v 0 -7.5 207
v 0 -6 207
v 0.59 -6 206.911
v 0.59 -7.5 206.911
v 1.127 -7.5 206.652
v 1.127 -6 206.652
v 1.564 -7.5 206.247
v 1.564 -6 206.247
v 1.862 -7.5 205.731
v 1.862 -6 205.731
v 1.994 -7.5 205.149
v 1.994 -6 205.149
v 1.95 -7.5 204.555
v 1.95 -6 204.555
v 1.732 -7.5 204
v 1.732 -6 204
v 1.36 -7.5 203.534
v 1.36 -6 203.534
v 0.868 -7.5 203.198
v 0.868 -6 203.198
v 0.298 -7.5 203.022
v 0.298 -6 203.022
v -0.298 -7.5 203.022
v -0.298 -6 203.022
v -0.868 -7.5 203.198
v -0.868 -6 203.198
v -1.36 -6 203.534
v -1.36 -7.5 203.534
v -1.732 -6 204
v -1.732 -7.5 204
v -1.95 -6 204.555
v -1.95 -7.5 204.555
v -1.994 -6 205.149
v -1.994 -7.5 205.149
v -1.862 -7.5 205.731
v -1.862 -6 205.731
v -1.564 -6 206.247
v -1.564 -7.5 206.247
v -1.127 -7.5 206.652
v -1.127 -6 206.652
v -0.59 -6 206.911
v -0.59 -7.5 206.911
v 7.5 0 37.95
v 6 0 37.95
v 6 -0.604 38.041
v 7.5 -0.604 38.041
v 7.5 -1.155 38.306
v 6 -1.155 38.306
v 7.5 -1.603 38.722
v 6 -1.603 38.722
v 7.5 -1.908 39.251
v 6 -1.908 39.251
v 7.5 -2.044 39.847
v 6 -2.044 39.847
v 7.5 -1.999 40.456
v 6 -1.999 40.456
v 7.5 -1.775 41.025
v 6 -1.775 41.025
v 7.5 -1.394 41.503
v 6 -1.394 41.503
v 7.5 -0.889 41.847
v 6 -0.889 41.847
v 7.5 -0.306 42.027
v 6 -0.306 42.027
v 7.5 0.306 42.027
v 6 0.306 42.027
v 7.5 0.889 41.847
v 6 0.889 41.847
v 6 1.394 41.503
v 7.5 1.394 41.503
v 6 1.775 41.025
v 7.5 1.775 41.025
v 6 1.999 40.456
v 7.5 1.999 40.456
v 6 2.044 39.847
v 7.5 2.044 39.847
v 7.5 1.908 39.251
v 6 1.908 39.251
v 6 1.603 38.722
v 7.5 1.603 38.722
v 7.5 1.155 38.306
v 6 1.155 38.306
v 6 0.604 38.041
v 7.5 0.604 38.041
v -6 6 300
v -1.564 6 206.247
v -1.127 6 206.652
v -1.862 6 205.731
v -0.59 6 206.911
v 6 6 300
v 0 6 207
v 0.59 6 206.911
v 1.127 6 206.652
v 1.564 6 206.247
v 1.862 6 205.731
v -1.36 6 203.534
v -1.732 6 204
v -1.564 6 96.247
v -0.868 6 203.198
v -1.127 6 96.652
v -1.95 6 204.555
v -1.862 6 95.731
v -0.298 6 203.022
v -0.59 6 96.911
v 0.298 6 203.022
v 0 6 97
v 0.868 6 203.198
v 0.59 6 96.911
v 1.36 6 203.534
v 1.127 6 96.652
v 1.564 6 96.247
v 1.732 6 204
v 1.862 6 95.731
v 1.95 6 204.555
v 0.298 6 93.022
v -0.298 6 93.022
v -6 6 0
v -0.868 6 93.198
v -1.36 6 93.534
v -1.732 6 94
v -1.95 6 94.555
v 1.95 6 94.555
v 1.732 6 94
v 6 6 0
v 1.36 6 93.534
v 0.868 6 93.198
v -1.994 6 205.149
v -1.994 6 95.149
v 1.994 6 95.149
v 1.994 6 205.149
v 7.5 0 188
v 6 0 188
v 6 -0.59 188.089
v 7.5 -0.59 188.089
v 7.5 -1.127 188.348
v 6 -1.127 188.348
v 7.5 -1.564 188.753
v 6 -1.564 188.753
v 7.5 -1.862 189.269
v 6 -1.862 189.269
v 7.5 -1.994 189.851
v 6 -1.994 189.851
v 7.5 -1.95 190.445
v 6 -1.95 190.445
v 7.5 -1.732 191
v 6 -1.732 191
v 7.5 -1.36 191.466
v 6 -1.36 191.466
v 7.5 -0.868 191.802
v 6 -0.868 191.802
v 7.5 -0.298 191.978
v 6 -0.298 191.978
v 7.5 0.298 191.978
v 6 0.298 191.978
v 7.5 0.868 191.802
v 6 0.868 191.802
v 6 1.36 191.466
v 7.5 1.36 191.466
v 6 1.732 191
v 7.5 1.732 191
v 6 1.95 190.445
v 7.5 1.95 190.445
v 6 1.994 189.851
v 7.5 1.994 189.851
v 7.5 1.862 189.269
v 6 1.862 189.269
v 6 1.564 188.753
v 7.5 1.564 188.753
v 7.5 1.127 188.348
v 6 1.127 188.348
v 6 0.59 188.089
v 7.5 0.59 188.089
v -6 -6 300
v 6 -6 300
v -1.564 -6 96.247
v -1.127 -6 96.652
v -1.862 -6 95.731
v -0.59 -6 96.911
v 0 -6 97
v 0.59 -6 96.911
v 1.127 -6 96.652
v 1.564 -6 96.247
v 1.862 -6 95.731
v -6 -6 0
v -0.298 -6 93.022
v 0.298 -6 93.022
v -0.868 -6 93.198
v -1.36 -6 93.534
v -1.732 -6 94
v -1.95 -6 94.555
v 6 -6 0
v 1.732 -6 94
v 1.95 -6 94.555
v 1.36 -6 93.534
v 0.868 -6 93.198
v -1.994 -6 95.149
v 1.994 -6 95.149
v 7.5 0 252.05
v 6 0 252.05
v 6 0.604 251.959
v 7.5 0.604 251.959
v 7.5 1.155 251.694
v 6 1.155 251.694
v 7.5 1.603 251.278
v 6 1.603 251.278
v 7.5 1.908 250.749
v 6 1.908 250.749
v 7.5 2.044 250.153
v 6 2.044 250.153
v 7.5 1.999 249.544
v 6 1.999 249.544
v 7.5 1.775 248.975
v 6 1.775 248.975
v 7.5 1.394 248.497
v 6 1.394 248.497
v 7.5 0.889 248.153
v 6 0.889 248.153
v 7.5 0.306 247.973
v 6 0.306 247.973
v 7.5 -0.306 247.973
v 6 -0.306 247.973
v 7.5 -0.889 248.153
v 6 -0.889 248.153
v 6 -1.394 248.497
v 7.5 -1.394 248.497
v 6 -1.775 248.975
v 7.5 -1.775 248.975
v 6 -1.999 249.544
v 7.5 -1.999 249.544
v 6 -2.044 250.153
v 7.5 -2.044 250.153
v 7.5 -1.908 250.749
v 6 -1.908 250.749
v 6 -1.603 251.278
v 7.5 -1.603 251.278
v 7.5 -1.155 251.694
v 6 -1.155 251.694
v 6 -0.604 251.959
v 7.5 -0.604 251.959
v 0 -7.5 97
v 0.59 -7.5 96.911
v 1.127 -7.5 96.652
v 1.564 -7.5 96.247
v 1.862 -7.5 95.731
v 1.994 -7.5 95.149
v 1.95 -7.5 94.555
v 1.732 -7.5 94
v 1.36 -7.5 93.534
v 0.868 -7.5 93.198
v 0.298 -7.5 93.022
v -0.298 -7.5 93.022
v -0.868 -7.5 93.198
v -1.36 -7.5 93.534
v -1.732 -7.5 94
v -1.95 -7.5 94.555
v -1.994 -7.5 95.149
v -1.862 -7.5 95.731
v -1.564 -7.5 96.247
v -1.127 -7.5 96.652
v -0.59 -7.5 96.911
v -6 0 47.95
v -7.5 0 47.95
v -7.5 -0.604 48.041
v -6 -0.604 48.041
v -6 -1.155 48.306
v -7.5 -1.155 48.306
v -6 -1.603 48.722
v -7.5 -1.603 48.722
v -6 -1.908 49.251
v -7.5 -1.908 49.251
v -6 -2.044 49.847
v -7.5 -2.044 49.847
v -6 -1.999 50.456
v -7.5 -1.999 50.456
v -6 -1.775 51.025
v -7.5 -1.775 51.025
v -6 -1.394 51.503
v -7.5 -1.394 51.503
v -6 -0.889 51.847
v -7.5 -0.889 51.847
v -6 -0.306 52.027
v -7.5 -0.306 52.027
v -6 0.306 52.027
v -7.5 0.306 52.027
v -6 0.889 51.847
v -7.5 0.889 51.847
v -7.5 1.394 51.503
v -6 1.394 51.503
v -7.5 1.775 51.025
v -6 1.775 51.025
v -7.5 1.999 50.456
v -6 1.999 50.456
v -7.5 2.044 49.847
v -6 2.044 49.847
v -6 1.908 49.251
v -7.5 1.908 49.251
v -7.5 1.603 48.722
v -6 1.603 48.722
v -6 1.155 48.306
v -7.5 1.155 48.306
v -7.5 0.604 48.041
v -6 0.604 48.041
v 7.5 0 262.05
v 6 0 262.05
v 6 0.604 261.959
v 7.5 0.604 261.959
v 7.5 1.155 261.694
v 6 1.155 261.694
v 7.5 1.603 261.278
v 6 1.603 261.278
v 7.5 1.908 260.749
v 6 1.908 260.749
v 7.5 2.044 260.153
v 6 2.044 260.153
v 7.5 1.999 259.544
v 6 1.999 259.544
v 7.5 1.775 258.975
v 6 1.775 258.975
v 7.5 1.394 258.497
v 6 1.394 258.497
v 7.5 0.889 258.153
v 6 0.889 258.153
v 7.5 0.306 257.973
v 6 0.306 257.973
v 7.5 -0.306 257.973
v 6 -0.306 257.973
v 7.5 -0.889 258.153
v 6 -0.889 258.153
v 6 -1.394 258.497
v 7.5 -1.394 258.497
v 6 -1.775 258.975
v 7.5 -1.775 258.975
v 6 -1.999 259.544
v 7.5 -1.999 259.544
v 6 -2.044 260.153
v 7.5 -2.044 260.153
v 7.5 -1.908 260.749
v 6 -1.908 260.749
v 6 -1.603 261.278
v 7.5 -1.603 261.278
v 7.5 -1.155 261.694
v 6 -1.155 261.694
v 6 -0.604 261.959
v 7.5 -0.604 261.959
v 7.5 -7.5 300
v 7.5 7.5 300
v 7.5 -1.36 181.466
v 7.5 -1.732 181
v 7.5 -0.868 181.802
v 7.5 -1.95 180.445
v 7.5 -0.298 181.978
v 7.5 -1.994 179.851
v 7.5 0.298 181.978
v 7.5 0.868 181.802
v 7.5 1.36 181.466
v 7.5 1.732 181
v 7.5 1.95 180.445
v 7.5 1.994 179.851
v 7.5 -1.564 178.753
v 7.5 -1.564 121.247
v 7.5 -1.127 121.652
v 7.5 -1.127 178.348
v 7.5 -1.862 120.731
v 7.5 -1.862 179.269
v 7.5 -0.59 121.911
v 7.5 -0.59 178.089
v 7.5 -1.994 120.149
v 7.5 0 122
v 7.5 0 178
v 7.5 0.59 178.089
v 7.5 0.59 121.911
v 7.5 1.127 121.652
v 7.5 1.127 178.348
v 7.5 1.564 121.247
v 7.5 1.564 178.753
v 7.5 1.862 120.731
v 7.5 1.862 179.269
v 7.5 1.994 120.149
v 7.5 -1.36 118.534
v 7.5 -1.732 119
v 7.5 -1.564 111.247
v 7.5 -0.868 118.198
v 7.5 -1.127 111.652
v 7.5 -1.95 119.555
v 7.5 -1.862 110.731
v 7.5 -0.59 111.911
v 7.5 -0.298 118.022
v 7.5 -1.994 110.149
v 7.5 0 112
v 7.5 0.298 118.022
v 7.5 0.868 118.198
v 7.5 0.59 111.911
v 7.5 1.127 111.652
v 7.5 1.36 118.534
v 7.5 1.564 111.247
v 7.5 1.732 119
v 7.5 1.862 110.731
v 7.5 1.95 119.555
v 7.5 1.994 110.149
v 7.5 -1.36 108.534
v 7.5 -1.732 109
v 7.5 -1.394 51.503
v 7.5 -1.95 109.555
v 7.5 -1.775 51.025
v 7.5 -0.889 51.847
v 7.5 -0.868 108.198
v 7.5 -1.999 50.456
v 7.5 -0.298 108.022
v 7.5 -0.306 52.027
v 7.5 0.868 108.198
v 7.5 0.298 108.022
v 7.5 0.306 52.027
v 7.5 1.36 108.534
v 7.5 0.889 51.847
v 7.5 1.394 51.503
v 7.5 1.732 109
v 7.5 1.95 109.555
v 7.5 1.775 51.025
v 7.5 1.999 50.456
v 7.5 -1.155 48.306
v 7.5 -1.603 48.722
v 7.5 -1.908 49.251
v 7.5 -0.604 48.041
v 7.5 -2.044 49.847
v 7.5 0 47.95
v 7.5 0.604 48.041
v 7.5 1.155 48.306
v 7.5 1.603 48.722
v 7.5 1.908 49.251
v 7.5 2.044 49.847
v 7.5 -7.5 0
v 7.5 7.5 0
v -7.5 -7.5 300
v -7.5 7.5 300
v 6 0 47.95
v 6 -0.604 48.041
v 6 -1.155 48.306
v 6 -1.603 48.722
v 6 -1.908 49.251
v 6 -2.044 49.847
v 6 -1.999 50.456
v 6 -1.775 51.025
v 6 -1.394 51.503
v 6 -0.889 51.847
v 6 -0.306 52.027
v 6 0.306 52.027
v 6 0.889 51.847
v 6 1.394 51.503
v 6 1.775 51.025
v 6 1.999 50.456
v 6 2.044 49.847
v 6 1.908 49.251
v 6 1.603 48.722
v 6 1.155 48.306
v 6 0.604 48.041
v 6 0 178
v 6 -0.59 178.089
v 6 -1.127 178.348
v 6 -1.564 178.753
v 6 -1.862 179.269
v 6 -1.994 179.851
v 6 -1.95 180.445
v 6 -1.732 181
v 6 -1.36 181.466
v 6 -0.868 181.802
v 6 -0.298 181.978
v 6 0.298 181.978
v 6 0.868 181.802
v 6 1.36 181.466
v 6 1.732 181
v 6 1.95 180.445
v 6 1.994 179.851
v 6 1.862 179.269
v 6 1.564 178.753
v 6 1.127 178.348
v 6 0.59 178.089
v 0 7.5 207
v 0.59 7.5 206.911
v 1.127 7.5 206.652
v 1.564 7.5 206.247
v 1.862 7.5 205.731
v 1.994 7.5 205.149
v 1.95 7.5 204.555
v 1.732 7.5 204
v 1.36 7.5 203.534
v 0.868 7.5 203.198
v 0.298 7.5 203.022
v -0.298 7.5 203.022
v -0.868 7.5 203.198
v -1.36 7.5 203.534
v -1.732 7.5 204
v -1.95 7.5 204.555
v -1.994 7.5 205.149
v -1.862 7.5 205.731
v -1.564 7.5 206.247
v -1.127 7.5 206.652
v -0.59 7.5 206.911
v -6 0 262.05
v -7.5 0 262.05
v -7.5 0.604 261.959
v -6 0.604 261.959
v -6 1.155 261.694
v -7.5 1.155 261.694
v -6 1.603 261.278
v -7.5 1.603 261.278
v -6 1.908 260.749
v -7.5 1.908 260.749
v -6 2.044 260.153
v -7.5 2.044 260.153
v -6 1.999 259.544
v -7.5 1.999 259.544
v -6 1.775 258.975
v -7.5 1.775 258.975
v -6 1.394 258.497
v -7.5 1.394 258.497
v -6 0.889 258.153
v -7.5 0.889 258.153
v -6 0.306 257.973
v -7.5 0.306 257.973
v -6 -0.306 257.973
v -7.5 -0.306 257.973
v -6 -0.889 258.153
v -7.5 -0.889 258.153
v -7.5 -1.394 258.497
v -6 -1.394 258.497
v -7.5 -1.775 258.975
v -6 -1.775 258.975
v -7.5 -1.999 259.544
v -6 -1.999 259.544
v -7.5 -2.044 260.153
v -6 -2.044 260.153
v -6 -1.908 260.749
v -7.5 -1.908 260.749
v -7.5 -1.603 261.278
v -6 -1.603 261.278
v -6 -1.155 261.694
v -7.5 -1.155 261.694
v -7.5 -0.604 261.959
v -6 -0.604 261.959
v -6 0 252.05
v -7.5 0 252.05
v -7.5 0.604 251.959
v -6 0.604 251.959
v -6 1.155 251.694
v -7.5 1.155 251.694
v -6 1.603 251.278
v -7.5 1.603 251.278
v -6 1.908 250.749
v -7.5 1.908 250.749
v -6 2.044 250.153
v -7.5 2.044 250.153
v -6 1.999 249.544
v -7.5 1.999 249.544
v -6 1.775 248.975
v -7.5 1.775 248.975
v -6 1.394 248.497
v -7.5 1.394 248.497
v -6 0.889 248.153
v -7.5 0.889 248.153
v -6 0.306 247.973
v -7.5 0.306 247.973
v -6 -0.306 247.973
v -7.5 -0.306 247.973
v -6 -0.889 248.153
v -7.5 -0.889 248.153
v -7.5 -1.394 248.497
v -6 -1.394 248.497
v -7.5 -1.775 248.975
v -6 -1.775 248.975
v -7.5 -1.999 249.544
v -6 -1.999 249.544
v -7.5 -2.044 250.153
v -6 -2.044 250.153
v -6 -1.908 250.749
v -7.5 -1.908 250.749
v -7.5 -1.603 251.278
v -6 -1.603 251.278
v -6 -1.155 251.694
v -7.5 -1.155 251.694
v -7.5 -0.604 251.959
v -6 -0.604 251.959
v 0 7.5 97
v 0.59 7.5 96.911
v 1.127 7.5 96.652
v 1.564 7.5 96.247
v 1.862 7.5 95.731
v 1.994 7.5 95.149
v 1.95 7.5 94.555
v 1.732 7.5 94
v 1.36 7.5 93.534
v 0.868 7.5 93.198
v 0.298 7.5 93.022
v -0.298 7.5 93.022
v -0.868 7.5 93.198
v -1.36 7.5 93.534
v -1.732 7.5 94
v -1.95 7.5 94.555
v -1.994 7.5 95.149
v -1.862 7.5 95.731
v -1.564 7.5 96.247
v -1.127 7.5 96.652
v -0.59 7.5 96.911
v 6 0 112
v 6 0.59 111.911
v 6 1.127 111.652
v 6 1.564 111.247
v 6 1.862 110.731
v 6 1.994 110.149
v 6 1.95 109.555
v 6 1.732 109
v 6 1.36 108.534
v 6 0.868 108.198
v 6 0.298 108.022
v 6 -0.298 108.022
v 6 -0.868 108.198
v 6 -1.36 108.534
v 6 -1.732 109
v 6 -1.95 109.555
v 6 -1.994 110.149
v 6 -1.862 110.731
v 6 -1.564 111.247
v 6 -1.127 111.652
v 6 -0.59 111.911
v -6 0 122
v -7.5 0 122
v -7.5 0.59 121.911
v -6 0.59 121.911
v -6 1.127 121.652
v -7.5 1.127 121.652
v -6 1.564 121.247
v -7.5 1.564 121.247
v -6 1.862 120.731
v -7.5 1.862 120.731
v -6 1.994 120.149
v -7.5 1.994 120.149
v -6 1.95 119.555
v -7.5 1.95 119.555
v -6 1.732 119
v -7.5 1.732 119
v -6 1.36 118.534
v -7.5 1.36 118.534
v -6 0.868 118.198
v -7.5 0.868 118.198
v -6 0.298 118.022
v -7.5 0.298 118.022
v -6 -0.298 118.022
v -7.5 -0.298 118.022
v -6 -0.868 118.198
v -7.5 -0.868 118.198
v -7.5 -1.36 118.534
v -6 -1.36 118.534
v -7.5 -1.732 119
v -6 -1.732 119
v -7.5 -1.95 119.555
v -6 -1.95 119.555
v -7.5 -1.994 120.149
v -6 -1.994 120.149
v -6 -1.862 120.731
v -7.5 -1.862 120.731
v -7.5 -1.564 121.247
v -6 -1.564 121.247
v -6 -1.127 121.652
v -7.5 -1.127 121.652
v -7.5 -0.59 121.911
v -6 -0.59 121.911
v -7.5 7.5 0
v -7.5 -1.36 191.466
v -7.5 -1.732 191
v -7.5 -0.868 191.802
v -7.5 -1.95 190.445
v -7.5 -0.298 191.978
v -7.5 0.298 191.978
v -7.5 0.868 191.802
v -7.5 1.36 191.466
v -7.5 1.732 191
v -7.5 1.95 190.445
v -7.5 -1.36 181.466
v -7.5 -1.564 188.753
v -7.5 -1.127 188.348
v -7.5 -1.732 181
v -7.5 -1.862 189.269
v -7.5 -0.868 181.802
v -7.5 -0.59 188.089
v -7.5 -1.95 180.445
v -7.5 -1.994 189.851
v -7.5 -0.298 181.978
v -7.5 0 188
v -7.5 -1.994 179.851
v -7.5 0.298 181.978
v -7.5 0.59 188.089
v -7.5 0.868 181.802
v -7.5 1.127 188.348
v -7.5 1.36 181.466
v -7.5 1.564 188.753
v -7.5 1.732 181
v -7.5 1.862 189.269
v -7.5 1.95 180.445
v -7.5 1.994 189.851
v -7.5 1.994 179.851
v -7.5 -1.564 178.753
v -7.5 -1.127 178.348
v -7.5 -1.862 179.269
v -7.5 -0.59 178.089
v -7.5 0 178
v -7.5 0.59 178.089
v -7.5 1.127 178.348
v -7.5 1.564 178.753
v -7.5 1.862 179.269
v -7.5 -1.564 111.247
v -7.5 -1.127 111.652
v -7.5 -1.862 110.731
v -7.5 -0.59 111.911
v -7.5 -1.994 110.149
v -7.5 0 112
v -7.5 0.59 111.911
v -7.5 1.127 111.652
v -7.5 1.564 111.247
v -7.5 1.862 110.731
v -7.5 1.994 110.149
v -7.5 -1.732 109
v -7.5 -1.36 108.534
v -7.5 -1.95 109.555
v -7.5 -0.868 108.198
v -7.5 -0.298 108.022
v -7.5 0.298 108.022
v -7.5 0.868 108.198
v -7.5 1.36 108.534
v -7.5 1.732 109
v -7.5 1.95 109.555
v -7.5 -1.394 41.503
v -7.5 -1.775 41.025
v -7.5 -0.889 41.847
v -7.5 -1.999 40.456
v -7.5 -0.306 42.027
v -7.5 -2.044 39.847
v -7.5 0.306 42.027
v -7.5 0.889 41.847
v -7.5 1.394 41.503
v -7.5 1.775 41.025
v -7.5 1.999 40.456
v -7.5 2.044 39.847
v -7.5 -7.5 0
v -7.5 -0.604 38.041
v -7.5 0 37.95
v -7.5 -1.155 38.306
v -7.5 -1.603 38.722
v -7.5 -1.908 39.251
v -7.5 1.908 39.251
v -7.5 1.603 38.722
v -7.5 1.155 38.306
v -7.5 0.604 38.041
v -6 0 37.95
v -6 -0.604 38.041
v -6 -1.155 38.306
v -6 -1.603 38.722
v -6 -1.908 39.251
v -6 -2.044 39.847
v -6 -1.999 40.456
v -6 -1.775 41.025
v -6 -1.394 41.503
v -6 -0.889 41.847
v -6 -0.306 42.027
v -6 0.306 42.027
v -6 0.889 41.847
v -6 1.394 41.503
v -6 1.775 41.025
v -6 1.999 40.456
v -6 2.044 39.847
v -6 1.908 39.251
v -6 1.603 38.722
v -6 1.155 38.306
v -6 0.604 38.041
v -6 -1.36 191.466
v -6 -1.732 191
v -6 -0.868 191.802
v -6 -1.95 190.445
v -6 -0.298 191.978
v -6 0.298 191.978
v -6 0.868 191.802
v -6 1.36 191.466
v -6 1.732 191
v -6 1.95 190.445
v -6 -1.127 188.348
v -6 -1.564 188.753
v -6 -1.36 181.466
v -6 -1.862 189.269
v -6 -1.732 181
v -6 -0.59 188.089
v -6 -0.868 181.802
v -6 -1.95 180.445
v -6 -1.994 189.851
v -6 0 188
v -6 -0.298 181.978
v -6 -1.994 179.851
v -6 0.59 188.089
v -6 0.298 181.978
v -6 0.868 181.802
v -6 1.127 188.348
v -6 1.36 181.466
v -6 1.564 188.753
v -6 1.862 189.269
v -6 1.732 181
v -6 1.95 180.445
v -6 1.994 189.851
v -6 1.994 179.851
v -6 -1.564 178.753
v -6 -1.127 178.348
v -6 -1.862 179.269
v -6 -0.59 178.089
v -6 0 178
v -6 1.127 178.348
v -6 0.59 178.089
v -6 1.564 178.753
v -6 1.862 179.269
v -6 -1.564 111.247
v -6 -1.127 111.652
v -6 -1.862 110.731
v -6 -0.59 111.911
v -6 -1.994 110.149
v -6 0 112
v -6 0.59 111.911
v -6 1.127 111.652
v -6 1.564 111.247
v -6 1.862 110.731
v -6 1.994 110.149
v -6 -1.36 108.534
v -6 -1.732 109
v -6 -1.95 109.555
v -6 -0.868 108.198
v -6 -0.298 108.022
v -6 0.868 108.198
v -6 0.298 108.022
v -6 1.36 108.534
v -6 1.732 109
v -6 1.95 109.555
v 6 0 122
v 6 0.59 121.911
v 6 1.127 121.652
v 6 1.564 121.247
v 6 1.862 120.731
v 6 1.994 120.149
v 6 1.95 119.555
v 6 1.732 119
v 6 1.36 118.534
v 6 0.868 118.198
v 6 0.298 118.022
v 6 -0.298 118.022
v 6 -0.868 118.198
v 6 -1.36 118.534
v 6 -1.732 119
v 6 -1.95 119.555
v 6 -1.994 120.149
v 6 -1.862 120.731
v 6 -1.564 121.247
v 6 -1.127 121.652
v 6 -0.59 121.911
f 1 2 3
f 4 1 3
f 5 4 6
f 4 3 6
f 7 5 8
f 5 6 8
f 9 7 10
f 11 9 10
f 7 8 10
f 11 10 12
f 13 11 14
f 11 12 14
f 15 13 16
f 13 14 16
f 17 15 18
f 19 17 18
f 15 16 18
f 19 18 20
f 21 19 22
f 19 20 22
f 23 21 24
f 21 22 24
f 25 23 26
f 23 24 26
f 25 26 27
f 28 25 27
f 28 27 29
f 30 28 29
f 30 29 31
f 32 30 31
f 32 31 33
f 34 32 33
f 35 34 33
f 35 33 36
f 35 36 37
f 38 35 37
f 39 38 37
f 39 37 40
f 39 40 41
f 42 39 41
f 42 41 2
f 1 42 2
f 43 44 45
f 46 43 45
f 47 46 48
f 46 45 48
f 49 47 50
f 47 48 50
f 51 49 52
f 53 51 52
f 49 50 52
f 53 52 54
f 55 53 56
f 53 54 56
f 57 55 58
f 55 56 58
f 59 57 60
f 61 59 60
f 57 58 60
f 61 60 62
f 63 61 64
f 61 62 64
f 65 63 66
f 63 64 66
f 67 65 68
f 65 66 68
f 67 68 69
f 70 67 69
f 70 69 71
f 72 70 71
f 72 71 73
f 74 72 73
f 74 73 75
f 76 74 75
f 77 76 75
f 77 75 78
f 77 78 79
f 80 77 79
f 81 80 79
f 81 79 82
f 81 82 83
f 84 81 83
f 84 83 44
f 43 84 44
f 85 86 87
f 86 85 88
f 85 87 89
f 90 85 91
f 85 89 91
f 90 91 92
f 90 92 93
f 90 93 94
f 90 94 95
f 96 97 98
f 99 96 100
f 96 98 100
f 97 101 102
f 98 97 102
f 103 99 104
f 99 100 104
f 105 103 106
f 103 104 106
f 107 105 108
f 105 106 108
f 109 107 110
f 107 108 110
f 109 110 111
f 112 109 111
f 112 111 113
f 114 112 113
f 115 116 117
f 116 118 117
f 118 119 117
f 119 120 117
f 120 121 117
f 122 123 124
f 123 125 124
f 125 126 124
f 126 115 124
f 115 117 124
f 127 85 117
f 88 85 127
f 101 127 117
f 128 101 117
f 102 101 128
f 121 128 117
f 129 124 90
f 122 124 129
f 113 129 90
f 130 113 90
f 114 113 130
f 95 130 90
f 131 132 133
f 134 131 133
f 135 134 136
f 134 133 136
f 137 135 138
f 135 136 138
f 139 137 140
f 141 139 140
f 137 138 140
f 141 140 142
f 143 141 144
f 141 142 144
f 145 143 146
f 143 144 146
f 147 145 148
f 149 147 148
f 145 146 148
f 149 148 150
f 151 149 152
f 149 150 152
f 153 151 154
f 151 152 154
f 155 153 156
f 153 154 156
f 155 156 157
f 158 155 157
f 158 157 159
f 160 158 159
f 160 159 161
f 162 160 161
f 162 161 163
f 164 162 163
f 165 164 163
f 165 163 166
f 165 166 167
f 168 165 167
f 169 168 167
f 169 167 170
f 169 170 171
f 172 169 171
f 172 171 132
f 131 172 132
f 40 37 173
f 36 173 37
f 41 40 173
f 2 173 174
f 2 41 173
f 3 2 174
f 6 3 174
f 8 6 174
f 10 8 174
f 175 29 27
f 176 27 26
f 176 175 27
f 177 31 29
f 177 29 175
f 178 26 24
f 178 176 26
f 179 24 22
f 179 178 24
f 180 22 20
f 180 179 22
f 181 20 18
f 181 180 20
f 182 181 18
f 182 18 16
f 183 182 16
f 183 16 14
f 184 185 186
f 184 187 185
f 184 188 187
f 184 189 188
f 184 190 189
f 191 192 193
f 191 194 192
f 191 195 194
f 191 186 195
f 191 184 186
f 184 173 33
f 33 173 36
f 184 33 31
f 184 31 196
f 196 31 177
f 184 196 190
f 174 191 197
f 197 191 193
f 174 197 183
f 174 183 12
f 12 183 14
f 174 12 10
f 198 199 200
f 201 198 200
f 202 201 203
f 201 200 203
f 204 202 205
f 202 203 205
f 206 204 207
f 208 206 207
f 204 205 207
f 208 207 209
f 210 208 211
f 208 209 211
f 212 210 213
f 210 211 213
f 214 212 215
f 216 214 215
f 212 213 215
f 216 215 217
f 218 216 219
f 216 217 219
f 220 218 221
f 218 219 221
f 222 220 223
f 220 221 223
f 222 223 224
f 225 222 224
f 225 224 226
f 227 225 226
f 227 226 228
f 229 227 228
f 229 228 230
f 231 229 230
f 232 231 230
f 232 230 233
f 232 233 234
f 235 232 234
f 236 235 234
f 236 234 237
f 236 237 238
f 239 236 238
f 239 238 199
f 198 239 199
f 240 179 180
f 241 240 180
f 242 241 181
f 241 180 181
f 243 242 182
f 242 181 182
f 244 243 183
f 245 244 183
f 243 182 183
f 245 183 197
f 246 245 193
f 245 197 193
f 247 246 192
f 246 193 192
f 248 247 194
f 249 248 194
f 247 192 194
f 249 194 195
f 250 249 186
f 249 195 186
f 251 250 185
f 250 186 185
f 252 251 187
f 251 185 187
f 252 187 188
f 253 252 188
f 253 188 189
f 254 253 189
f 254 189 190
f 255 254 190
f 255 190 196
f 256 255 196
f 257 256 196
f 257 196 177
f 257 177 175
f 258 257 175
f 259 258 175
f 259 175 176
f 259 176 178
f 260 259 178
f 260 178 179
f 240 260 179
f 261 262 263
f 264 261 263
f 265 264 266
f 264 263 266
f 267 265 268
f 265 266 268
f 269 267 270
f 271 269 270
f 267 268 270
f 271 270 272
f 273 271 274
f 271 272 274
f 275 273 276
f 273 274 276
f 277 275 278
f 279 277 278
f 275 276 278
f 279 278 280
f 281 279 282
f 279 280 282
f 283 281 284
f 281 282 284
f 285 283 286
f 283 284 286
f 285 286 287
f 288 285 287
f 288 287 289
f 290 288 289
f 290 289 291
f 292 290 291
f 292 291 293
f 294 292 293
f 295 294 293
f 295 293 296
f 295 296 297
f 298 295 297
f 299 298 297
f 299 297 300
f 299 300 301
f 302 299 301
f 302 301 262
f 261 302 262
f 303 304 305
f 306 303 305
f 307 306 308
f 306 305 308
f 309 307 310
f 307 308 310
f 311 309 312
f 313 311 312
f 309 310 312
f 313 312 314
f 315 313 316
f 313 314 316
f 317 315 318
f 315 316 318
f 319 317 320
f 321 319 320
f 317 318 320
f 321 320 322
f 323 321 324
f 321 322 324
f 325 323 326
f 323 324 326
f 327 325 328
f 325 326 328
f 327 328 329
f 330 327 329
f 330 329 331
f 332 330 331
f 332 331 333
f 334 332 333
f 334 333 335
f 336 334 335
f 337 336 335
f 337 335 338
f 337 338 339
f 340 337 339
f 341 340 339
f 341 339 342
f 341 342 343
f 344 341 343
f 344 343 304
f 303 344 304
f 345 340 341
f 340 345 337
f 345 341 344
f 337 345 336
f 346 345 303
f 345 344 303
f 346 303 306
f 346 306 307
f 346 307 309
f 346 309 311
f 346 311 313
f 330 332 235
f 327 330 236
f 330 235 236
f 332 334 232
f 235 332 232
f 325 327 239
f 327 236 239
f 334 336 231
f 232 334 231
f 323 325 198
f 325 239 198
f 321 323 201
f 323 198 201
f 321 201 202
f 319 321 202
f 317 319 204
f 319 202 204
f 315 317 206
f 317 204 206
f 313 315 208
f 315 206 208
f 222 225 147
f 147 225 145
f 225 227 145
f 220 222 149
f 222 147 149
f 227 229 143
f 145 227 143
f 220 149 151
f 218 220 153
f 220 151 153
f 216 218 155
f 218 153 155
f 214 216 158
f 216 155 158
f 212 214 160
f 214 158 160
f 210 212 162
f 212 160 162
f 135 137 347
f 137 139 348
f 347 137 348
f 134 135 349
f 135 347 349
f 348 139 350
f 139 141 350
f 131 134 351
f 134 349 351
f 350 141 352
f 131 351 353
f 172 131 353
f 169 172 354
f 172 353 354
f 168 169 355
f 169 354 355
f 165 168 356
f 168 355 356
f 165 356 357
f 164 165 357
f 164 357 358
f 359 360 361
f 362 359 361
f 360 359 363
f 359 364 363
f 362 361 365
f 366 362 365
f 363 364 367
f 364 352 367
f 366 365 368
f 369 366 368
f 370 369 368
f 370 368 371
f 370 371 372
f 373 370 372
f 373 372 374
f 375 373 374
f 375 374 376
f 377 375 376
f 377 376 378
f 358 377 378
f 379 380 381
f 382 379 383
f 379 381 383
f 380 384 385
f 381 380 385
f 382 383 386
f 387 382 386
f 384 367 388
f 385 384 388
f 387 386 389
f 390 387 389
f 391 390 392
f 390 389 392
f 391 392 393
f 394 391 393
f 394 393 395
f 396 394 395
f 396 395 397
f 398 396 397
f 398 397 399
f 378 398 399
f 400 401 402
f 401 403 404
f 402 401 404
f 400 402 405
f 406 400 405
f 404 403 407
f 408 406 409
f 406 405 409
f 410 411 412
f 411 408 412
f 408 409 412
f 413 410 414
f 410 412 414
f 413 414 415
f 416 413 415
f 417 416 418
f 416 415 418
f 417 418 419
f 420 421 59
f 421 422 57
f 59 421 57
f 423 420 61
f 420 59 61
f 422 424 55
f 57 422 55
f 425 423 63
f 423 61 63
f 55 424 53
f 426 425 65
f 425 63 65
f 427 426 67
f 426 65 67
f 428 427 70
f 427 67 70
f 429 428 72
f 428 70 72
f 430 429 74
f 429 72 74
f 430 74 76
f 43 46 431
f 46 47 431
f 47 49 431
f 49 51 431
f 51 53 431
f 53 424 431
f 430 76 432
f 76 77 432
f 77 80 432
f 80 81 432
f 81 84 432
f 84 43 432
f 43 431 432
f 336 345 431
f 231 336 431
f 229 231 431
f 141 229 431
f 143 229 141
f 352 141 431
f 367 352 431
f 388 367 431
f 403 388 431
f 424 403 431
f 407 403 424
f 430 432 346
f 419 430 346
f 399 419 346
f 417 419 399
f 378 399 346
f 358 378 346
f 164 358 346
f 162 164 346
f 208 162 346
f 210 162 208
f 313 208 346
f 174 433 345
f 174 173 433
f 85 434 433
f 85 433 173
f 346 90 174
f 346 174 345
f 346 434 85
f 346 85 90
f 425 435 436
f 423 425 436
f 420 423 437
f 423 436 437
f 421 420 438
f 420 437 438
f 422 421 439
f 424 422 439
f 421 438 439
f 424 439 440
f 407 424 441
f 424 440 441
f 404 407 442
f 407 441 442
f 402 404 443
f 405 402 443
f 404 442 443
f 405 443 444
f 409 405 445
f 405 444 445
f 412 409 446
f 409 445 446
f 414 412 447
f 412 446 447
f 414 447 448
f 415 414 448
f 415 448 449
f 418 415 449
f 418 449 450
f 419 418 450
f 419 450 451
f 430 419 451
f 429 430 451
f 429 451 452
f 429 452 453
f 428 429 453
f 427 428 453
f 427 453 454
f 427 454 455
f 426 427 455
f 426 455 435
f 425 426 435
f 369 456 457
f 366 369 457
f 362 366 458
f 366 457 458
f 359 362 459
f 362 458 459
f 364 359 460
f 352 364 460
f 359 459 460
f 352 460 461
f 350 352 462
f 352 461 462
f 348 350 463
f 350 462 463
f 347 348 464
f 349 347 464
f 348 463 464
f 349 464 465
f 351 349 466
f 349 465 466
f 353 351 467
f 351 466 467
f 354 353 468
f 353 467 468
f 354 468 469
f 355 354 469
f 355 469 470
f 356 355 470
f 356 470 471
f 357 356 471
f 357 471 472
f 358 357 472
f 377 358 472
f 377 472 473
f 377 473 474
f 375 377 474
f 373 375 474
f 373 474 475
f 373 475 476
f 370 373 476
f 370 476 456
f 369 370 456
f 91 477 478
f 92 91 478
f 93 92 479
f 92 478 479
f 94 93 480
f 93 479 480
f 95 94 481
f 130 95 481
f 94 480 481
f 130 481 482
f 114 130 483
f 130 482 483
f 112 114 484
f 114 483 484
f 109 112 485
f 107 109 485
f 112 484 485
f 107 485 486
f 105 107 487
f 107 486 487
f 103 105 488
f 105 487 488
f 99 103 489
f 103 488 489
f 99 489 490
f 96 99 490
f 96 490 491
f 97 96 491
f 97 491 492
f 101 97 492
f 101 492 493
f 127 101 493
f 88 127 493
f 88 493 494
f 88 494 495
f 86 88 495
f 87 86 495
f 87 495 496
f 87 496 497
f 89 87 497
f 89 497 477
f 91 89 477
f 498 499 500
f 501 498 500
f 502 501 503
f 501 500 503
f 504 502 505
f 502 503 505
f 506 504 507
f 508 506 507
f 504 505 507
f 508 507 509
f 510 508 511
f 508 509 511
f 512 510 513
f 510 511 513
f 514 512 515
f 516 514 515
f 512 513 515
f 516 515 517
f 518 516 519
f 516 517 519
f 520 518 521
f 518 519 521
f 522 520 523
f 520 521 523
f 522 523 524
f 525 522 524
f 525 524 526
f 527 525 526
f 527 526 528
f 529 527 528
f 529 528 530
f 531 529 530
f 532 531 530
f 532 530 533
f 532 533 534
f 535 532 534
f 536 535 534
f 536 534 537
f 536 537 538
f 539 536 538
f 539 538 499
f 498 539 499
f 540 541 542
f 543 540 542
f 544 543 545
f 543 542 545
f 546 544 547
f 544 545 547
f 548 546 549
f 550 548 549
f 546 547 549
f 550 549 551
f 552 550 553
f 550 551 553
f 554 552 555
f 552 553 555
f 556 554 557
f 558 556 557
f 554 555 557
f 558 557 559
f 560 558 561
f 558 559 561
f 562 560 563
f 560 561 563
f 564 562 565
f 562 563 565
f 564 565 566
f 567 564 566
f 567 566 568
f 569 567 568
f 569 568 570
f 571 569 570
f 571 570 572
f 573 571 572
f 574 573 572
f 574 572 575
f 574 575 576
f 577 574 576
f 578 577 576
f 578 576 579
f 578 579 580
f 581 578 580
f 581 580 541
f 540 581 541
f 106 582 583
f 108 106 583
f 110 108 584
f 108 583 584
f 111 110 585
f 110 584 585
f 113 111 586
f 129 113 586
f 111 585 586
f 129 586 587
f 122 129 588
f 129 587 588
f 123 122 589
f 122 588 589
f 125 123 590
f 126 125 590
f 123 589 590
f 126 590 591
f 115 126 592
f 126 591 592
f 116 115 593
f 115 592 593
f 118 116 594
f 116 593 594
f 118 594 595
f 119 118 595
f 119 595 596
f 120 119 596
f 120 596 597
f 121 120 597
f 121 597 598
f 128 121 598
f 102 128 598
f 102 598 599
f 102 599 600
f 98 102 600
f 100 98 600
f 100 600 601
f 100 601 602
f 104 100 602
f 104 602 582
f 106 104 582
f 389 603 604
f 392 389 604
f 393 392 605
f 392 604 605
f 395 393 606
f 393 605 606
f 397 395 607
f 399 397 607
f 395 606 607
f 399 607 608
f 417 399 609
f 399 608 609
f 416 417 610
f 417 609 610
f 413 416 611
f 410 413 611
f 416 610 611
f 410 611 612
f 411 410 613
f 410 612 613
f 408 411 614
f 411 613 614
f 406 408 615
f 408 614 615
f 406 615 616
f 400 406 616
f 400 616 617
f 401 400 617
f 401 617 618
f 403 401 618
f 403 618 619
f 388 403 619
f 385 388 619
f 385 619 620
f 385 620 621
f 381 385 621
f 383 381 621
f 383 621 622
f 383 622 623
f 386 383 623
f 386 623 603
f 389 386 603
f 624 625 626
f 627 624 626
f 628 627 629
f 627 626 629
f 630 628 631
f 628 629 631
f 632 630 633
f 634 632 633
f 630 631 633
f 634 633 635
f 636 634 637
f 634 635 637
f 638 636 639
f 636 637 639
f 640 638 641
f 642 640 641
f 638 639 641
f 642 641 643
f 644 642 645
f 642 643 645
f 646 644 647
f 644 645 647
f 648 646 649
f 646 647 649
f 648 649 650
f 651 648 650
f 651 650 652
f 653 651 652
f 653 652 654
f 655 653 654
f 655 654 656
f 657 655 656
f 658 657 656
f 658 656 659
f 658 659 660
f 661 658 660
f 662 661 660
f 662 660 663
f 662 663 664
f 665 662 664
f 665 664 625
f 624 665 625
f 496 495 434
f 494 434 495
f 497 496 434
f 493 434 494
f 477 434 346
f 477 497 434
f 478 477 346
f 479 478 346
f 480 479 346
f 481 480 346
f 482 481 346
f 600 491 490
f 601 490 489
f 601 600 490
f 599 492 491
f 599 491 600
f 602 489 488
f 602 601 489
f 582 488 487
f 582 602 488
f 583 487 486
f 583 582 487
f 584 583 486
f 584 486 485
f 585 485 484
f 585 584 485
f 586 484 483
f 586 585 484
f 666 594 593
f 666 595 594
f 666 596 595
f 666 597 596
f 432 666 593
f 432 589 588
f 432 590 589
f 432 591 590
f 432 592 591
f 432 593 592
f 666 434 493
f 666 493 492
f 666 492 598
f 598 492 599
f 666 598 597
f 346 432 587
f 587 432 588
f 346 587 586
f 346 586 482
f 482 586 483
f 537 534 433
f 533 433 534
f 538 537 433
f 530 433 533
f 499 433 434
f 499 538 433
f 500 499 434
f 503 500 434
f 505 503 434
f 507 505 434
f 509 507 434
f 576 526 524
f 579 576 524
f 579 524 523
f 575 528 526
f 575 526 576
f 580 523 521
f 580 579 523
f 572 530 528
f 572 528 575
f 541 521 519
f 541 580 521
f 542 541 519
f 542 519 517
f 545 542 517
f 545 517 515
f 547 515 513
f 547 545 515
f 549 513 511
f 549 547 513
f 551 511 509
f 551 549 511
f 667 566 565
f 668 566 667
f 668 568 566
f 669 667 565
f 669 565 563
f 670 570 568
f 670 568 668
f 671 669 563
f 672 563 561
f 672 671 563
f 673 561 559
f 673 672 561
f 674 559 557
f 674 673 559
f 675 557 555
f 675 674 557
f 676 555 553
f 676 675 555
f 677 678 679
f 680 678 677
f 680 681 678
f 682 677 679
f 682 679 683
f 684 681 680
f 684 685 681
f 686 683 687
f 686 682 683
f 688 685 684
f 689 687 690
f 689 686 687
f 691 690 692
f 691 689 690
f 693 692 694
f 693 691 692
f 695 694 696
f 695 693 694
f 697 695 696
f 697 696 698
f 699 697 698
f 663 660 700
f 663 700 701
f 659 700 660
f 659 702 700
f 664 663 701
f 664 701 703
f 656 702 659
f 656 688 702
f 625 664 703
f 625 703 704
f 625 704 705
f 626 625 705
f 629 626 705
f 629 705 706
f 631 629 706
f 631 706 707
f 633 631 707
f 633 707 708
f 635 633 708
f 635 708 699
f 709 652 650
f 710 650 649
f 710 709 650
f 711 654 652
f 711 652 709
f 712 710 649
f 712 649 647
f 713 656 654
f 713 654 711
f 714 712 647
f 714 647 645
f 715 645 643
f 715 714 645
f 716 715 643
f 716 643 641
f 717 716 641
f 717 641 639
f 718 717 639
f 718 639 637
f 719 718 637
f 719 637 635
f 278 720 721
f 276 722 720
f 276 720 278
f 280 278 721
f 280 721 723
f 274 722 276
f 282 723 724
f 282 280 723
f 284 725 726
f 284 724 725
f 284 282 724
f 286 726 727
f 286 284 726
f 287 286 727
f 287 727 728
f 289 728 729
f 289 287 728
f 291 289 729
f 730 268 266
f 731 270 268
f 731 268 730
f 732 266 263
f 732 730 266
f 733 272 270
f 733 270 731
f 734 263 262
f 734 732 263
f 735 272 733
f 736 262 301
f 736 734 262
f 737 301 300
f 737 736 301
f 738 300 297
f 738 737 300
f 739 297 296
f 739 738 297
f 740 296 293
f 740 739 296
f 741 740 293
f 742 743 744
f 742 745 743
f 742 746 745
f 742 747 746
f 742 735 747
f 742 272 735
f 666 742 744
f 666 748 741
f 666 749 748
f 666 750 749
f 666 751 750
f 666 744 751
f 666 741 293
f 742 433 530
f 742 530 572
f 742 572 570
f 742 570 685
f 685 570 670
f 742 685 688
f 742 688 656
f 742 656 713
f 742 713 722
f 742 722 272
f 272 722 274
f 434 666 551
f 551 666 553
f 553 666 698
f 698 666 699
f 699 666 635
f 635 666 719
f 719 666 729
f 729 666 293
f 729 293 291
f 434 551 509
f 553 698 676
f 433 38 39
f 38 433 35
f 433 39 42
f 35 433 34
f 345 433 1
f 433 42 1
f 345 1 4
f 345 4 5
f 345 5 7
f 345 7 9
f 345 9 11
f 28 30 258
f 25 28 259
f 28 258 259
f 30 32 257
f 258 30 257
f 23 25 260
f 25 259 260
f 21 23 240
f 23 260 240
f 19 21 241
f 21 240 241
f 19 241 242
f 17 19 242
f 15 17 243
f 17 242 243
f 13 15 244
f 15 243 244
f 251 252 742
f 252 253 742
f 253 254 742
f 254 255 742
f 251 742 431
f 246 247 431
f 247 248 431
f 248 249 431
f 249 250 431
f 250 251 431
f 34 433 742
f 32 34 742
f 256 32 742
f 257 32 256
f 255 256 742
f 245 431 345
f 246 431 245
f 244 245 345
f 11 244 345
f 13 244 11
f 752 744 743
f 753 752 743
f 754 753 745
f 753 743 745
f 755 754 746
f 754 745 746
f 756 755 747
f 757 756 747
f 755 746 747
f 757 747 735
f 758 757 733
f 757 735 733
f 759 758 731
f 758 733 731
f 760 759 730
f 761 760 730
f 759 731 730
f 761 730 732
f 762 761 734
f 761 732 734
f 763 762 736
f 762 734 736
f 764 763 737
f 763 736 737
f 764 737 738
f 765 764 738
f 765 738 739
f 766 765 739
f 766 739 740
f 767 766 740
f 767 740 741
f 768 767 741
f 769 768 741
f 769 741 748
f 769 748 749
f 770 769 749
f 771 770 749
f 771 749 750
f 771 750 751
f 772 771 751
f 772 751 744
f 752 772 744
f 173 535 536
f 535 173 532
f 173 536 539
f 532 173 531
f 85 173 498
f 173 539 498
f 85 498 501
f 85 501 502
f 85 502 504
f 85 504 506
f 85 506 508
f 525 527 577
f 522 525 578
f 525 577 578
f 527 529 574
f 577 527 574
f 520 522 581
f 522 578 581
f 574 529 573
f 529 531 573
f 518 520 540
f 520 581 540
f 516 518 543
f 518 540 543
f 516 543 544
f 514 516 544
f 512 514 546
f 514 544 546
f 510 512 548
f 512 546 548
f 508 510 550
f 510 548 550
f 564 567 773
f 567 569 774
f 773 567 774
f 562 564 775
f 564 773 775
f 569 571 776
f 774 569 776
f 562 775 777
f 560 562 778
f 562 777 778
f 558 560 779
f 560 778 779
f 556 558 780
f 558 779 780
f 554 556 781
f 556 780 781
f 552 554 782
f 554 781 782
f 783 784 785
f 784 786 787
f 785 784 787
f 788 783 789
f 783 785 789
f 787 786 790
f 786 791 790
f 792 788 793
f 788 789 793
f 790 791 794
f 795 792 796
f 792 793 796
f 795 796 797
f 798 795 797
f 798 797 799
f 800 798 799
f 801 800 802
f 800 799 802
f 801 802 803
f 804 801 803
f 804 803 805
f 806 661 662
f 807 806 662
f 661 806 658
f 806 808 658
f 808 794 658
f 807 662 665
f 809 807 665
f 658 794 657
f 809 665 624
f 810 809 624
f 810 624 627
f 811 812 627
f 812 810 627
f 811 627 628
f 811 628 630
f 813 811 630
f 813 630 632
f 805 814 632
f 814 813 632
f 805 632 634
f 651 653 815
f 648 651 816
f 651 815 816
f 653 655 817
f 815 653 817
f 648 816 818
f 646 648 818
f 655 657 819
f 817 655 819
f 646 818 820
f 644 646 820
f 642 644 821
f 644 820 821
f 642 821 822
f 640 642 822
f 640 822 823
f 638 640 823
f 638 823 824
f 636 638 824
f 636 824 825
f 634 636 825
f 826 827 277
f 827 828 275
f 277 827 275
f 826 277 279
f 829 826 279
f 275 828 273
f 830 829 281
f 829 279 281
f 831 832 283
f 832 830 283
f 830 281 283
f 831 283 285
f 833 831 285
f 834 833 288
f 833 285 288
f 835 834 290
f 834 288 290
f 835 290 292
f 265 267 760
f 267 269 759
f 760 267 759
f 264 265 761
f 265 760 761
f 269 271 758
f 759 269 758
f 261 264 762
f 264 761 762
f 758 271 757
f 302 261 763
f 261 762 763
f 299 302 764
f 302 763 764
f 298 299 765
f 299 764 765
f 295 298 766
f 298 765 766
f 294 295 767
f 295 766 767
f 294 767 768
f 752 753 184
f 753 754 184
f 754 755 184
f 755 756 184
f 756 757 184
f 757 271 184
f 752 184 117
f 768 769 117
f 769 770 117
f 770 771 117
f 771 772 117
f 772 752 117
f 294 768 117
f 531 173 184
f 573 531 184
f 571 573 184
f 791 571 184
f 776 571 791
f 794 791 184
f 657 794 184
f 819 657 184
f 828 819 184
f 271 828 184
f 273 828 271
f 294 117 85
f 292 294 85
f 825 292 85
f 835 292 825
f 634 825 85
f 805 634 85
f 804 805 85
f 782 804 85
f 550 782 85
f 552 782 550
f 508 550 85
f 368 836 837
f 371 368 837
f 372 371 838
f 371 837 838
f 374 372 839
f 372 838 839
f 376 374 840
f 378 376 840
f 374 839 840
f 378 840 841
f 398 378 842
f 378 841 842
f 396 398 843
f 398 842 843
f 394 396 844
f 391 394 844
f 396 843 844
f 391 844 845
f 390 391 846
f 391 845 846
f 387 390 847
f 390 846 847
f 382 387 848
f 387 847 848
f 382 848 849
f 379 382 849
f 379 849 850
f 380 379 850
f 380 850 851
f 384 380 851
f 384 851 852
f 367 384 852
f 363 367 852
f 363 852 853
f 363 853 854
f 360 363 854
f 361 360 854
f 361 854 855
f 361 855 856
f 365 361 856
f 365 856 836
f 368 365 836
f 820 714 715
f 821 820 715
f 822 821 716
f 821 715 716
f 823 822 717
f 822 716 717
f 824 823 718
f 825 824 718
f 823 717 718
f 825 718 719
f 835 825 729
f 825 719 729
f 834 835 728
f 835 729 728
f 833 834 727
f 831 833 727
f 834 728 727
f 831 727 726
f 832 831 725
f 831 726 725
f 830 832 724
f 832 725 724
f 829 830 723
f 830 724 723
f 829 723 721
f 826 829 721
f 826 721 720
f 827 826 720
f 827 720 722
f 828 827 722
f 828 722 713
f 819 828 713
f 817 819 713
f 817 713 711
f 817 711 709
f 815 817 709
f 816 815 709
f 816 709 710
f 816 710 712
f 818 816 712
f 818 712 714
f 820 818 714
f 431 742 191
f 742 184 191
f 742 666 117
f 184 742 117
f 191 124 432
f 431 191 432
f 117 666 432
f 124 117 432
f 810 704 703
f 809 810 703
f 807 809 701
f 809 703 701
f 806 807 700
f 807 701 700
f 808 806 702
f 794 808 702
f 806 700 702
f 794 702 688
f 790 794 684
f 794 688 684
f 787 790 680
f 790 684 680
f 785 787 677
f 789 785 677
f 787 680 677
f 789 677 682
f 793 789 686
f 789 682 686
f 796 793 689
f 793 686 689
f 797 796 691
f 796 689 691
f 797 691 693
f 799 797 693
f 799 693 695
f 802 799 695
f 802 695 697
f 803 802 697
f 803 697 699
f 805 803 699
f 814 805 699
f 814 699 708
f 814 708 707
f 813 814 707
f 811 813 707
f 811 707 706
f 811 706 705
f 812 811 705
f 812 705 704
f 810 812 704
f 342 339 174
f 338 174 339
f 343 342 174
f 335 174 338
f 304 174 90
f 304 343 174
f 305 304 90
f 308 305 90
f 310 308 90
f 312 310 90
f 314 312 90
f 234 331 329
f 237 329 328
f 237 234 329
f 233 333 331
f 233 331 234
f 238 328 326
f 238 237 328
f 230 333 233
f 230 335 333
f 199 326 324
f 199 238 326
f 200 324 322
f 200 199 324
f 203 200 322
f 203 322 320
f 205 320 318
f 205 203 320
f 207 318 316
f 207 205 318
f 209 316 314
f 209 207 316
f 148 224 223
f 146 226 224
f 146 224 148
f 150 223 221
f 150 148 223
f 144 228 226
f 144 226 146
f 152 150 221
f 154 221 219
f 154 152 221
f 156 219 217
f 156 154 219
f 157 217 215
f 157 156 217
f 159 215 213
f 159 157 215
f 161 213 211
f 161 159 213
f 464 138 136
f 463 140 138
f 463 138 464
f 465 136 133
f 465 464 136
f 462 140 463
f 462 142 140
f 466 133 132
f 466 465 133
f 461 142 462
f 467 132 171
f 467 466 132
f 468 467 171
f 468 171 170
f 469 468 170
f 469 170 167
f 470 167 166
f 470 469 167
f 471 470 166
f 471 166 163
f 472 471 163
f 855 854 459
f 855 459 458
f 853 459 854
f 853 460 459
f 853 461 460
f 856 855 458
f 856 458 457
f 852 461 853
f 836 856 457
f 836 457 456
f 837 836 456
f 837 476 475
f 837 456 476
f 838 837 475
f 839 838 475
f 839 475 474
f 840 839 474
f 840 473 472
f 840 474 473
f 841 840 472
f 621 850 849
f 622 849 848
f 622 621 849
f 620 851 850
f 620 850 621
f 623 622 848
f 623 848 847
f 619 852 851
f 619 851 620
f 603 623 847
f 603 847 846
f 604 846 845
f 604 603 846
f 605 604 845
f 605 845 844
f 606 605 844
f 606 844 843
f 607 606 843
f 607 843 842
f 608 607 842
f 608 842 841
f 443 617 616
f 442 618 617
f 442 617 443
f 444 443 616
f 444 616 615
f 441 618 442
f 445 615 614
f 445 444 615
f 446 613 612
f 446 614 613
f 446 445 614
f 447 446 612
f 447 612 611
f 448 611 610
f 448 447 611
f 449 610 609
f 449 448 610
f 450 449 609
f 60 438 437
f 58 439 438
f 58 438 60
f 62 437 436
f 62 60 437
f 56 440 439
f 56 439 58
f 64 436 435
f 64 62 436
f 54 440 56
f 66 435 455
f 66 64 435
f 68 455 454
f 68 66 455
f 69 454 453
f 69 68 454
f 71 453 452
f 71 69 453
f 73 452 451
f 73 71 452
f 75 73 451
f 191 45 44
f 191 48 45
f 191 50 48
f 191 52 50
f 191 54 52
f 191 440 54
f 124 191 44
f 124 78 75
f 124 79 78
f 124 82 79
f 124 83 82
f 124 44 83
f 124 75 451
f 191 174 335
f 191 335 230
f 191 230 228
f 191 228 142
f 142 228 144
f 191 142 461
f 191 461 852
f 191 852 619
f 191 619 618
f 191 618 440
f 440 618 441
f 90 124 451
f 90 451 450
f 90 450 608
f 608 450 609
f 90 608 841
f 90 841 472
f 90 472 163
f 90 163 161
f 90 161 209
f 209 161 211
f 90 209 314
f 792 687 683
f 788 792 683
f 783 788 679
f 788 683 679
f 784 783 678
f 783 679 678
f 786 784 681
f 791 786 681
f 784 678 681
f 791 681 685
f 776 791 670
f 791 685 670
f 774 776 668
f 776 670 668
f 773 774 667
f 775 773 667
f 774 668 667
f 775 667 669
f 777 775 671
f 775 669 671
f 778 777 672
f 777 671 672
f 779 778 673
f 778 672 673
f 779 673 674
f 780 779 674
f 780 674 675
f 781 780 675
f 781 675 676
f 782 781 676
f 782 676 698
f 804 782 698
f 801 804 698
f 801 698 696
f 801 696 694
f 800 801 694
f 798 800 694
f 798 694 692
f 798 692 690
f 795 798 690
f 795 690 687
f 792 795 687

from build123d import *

# Parameters (mm, degrees)
SKETCH_1_W          = 15
SKETCH_1_H          = 15
SKETCH_1_W_2        = 12
SKETCH_1_H_2        = 12
EXTRUDE_1_DEPTH     = 300
SKETCH_2_R          = 2
CUT_EXTRUDE_1_DEPTH = 30
SKETCH_4_R          = 2.05
CUT_EXTRUDE_3_DEPTH = 120
SKETCH_5_R          = 2
CUT_EXTRUDE_4_DEPTH = 49


with BuildPart() as part:
    # 草图1 → 凸台-拉伸1 (new body)
    with BuildSketch(Plane.XY):
        Rectangle(SKETCH_1_W, SKETCH_1_H)
        Rectangle(SKETCH_1_W_2, SKETCH_1_H_2, mode=Mode.SUBTRACT)
    extrude(amount=EXTRUDE_1_DEPTH)

    # 草图2 → 切除-拉伸1 (cut)
    with BuildSketch(Plane(origin=(0, 7.5, 0), x_dir=(1, 0, 0), z_dir=(0, 1, 0))):
        with Locations(Location((0, -205, 0), (0, 0, 270))):
            Circle(SKETCH_2_R)
        with Locations(Location((0, -95, 0), (0, 0, 270))):
            Circle(SKETCH_2_R)
    extrude(amount=-CUT_EXTRUDE_1_DEPTH, mode=Mode.SUBTRACT)

    # 草图4 → 切除-拉伸3 (cut)
    with BuildSketch(Plane.ZY.offset(7.5)):
        with Locations((250, 0)):
            Circle(SKETCH_4_R)
        with Locations((260, 0)):
            Circle(SKETCH_4_R)
        with Locations(Location((40, 0, 0), (0, 0, 180))):
            Circle(SKETCH_4_R)
        with Locations(Location((50, 0, 0), (0, 0, 180))):
            Circle(SKETCH_4_R)
    extrude(amount=-CUT_EXTRUDE_3_DEPTH, mode=Mode.SUBTRACT)

    # 草图5 → 切除-拉伸4 (cut)
    with BuildSketch(Plane.ZY.offset(7.5)):
        with Locations((120, 0)):
            Circle(SKETCH_5_R)
        with Locations((110, 0)):
            Circle(SKETCH_5_R)
        with Locations(Location((190, 0, 0), (0, 0, 180))):
            Circle(SKETCH_5_R)
        with Locations(Location((180, 0, 0), (0, 0, 180))):
            Circle(SKETCH_5_R)
    extrude(amount=-CUT_EXTRUDE_4_DEPTH, mode=Mode.SUBTRACT)


solid = part.part
